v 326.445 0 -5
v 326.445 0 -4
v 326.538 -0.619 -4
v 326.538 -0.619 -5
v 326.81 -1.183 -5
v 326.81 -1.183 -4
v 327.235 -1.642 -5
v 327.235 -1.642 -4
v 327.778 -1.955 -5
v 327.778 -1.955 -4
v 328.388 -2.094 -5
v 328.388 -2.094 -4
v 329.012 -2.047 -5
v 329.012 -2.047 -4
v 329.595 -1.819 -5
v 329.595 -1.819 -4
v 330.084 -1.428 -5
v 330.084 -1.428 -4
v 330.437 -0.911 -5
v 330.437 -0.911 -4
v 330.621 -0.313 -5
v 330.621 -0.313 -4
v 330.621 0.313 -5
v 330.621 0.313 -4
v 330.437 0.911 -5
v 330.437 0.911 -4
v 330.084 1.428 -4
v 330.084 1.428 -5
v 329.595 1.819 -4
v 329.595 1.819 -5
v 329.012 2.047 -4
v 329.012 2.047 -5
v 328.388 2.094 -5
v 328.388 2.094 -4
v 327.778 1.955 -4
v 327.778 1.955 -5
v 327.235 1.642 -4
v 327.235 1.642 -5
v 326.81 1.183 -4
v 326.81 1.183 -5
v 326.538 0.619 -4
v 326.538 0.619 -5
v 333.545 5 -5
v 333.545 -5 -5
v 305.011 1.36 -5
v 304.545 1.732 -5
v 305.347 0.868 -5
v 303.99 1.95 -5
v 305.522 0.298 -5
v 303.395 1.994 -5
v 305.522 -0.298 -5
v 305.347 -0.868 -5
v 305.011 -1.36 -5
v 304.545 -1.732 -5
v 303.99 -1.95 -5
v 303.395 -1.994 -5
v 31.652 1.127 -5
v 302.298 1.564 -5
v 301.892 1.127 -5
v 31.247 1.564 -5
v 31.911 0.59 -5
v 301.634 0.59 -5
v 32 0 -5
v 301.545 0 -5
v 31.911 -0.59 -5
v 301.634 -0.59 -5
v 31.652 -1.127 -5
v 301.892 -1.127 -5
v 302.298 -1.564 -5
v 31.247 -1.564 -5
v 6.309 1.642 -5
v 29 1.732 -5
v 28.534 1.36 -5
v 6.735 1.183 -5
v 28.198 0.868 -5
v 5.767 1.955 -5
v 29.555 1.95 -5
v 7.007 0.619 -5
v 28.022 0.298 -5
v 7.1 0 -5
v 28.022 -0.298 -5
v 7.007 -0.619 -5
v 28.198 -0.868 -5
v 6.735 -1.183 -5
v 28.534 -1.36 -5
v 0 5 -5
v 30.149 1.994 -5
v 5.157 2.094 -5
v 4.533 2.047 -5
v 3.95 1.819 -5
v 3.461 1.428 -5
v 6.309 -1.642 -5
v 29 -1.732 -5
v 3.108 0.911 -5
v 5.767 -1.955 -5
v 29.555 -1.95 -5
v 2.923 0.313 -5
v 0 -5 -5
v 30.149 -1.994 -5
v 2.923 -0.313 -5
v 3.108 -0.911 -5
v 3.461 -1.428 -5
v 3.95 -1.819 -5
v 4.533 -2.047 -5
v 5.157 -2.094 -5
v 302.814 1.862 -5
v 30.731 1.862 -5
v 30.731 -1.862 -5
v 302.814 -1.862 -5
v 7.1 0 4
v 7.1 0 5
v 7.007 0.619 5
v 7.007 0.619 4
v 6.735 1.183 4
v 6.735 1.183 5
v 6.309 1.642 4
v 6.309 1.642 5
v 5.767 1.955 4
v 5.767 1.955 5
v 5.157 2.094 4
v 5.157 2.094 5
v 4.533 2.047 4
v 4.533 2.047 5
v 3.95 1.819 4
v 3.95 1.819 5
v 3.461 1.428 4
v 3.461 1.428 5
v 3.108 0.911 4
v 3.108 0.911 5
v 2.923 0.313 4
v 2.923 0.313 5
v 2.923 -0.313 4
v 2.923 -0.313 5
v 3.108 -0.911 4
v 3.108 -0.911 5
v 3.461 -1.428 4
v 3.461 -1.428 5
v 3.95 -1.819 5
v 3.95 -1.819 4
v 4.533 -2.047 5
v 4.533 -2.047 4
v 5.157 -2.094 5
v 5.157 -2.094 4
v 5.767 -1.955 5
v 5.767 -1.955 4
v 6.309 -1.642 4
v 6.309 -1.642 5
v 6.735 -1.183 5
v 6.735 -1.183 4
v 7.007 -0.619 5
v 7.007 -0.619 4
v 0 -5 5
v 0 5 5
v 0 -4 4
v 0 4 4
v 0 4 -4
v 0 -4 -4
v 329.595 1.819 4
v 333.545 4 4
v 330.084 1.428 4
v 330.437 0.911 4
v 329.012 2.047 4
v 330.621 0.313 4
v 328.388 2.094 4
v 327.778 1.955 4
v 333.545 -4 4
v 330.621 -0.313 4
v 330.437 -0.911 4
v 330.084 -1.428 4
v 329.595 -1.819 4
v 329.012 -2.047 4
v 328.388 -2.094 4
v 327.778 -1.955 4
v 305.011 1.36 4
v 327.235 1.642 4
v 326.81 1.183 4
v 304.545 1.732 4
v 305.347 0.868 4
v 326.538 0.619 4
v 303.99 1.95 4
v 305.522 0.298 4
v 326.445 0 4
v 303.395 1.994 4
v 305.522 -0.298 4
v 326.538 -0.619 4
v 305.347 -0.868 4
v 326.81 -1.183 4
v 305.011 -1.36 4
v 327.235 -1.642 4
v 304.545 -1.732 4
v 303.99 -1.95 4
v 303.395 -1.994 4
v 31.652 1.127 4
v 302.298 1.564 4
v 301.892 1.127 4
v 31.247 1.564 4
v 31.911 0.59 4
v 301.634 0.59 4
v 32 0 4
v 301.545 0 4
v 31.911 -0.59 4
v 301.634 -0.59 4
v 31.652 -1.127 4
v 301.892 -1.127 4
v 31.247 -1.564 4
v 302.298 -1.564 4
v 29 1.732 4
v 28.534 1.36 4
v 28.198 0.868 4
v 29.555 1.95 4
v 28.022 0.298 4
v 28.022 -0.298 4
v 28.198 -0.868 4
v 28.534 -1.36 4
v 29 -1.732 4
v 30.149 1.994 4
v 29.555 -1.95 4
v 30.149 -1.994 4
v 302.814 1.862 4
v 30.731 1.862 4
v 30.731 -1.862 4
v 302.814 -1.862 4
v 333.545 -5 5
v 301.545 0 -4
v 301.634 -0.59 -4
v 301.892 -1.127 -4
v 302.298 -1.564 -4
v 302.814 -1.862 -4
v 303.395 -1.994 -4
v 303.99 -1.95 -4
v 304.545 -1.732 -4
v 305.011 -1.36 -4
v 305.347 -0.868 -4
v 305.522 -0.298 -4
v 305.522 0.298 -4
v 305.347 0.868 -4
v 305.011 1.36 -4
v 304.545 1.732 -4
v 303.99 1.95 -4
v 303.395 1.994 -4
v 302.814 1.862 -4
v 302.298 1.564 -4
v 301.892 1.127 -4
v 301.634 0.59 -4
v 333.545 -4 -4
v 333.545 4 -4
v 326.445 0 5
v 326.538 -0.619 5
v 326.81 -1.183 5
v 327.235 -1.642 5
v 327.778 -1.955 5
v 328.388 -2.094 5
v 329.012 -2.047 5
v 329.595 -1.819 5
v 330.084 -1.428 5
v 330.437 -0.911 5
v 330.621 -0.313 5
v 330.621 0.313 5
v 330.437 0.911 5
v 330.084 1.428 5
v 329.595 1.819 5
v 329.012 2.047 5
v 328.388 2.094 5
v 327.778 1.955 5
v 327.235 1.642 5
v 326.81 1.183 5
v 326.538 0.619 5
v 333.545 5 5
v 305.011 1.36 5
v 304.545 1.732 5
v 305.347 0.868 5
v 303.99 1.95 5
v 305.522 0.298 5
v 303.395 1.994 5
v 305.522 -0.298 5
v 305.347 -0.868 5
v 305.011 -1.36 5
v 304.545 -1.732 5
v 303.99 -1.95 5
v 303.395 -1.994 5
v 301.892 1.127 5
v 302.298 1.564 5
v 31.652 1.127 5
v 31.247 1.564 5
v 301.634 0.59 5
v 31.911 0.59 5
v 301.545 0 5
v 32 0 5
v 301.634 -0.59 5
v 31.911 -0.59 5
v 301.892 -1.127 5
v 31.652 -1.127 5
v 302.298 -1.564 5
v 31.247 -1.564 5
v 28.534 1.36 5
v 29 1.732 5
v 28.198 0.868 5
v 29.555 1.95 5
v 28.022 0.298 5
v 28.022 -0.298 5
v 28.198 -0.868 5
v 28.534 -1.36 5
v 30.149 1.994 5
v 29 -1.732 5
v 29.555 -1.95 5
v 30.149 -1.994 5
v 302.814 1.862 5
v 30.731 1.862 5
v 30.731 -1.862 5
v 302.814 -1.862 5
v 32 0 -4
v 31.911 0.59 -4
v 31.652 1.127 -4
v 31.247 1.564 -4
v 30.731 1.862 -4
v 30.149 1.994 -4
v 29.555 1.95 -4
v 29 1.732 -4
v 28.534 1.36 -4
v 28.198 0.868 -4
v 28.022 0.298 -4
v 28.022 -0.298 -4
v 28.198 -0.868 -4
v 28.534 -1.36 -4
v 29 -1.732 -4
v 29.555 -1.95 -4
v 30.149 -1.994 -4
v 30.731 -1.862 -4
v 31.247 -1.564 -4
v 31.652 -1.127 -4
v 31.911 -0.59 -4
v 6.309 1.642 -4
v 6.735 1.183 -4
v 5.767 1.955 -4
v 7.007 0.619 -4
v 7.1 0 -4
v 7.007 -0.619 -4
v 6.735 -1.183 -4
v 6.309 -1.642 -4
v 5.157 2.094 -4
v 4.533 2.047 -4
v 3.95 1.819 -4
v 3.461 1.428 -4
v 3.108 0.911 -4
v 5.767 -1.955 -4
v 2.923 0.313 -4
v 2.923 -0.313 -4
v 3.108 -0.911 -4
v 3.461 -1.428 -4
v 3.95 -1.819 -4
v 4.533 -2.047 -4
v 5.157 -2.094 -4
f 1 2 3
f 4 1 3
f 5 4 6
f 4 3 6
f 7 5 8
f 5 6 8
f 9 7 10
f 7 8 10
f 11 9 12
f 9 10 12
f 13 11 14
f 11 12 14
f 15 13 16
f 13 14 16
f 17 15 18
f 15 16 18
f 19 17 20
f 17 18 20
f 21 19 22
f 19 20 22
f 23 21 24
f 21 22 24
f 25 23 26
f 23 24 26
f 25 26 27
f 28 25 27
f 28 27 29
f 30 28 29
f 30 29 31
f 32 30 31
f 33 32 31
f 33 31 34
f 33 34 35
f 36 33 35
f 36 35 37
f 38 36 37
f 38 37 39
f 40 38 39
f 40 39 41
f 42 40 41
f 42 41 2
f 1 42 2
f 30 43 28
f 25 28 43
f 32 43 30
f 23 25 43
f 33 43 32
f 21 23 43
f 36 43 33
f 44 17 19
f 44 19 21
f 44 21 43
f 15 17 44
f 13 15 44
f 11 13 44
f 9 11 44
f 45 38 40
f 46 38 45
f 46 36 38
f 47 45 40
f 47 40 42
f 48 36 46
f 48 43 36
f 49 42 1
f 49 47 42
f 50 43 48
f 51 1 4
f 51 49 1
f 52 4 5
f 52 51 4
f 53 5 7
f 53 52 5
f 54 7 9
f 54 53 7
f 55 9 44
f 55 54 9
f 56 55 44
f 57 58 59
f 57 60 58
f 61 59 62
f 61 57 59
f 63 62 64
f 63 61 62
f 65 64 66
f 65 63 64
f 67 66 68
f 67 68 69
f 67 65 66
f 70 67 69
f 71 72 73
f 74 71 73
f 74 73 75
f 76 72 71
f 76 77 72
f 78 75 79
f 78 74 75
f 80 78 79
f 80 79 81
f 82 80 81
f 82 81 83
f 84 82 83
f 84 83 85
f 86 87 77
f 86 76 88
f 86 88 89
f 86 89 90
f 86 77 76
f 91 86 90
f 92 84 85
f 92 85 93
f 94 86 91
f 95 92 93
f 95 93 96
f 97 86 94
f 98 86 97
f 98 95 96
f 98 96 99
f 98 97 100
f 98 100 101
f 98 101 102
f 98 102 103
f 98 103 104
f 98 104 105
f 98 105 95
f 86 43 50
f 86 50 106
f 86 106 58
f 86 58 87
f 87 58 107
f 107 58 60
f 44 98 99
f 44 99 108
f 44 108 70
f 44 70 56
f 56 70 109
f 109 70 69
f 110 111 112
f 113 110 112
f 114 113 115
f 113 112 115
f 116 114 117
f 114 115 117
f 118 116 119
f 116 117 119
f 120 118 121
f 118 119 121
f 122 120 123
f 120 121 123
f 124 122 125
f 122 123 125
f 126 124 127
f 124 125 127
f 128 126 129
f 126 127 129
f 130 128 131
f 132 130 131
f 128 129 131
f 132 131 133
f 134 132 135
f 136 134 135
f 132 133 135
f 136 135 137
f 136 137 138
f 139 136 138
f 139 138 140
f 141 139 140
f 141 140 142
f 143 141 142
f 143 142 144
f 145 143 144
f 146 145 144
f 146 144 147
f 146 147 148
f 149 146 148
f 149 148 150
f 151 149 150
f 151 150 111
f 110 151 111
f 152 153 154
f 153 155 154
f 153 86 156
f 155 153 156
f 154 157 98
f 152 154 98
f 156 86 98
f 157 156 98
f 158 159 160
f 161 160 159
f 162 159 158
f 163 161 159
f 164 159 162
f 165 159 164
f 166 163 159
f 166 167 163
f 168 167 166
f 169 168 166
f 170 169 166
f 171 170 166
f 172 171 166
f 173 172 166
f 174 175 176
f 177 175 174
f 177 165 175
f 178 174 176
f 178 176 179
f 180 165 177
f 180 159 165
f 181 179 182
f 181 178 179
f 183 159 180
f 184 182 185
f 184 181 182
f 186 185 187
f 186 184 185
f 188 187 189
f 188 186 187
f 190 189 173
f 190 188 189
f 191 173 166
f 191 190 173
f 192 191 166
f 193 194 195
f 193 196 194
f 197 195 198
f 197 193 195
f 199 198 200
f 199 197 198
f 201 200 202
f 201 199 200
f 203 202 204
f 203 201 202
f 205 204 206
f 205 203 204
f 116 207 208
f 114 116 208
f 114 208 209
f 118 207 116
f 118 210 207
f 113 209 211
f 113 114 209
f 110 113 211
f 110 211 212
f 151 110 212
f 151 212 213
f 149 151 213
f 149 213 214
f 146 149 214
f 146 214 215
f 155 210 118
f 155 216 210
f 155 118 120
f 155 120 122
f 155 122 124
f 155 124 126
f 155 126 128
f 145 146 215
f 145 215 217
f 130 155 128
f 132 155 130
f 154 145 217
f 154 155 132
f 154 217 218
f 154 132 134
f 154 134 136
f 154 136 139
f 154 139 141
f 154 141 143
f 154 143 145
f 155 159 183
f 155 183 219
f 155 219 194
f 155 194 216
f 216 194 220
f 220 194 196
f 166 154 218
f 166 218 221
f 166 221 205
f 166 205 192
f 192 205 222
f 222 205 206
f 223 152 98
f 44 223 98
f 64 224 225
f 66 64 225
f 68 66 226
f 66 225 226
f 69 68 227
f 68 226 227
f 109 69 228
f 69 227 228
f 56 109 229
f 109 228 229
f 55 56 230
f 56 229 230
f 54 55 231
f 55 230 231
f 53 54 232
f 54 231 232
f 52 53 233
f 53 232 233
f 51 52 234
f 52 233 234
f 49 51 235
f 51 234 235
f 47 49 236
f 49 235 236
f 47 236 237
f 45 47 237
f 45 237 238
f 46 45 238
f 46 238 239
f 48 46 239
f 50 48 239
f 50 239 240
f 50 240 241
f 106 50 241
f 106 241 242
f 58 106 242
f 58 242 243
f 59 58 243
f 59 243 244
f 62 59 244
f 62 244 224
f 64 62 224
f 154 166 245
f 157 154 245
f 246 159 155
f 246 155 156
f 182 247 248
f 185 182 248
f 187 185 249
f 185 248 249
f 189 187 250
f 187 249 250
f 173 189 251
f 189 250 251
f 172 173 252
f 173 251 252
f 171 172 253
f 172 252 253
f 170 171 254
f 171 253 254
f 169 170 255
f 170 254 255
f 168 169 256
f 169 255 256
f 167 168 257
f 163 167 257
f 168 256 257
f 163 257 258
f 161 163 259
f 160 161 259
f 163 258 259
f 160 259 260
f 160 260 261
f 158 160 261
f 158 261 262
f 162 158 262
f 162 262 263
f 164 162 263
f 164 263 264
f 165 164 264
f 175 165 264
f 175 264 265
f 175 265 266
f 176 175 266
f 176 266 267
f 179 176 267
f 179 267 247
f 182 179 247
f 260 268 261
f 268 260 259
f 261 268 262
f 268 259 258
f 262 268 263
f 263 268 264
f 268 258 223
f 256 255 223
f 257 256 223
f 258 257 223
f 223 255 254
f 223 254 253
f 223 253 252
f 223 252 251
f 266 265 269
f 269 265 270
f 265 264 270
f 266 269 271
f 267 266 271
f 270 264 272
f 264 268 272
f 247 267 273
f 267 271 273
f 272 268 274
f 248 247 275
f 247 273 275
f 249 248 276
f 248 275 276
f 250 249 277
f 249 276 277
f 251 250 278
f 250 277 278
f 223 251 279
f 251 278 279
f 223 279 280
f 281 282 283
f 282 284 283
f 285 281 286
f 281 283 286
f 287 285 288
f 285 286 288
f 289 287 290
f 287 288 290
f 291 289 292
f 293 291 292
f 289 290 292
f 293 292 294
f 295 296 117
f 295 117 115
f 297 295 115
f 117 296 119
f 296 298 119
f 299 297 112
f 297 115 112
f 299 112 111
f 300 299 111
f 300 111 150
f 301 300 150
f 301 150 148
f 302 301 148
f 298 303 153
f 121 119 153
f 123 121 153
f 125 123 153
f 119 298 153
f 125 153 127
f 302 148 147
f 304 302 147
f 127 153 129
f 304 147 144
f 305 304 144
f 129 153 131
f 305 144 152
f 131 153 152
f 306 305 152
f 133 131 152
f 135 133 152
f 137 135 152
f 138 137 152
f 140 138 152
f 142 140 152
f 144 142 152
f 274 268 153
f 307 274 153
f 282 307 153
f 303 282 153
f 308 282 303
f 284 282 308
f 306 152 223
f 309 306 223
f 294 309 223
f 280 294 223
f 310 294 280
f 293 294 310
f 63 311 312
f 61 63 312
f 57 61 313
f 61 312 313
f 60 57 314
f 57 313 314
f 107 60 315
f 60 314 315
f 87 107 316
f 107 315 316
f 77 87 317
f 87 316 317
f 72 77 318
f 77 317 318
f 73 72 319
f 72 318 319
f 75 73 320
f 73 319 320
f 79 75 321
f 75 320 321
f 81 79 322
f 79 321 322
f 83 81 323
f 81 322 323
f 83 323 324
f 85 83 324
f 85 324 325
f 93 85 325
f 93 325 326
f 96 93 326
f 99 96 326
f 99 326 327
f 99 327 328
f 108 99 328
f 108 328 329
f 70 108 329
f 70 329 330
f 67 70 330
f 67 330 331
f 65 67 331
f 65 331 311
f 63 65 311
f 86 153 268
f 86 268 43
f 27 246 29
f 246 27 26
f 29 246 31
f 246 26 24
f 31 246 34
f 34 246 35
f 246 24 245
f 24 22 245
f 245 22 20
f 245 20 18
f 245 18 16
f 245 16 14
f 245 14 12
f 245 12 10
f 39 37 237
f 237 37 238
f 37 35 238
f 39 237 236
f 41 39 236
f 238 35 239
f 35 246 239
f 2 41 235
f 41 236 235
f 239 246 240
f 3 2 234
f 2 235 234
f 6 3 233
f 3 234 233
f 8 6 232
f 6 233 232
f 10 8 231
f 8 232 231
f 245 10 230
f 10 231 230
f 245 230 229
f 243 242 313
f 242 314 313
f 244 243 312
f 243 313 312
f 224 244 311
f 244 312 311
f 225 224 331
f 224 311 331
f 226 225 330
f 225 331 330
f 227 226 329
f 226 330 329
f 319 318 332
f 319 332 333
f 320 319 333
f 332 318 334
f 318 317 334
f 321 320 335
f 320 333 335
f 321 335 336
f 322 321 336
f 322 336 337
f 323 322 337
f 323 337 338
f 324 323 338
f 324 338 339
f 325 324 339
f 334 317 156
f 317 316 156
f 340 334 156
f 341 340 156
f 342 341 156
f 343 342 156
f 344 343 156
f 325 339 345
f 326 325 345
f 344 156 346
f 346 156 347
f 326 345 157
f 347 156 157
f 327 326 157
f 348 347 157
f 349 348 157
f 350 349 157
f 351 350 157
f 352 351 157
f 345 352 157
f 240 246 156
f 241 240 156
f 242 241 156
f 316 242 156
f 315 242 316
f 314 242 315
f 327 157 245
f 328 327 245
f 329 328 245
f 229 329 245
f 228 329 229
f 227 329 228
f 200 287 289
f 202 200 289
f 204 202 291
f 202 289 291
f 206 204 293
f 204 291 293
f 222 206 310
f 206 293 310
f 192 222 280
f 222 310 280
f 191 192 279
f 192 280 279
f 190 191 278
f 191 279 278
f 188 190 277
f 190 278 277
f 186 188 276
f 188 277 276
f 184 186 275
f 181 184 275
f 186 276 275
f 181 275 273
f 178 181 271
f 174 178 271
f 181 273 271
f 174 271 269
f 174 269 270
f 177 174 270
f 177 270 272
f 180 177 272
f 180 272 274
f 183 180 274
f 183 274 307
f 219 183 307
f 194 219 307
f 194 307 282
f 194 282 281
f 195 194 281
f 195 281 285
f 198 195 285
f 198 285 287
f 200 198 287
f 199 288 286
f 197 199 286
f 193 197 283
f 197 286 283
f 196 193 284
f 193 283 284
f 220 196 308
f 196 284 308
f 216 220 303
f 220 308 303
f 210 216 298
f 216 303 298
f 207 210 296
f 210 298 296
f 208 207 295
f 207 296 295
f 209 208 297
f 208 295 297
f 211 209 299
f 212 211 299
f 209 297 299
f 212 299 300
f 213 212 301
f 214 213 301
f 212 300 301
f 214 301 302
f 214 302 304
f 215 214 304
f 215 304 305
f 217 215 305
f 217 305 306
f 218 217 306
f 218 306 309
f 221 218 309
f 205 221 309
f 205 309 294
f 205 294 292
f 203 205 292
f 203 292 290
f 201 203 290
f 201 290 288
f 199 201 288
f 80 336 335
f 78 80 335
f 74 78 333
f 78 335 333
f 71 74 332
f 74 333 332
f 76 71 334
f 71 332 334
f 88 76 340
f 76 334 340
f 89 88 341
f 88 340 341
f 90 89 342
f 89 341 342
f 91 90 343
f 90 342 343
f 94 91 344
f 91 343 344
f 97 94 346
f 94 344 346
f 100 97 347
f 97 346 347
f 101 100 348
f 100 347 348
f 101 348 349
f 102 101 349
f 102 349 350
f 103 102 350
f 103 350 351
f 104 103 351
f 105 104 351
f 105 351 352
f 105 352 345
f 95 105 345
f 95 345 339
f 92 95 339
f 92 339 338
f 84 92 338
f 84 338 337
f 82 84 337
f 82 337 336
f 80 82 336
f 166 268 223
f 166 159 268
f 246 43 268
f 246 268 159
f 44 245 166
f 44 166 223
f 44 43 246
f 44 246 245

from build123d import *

# Parameters (mm, degrees)
SKETCH_1_W          = 10
SKETCH_1_H          = 10
SKETCH_1_W_2        = 8
SKETCH_1_H_2        = 8
EXTRUDE_1_DEPTH     = 333.544819152
SKETCH_2_R          = 2.1
SKETCH_2_R_2        = 2
CUT_EXTRUDE_1_DEPTH = 334.732147662


with BuildPart() as part:
    # ｽｹｯﾁ1 → 押し出し-薄板1 (new body)
    with BuildSketch(Plane(origin=(0, 0, 0), x_dir=(0, -1, 0), z_dir=(1, 0, 0))):
        Rectangle(SKETCH_1_W, SKETCH_1_H)
        Rectangle(SKETCH_1_W_2, SKETCH_1_H_2, mode=Mode.SUBTRACT)
    extrude(amount=EXTRUDE_1_DEPTH)

    # ｽｹｯﾁ2 → ｶｯﾄ - 押し出し1 (cut, through all)
    with BuildSketch(Plane.XY.offset(5)):
        with Locations((5, 0)):
            Circle(SKETCH_2_R)
        with Locations(Location((328.544819152, 0, 0), (0, 0, 180))):
            Circle(SKETCH_2_R)
        with Locations((30, 0)):
            Circle(SKETCH_2_R_2)
        with Locations(Location((303.544819152, 0, 0), (0, 0, 180))):
            Circle(SKETCH_2_R_2)
    extrude(amount=-CUT_EXTRUDE_1_DEPTH, mode=Mode.SUBTRACT)


solid = part.part
